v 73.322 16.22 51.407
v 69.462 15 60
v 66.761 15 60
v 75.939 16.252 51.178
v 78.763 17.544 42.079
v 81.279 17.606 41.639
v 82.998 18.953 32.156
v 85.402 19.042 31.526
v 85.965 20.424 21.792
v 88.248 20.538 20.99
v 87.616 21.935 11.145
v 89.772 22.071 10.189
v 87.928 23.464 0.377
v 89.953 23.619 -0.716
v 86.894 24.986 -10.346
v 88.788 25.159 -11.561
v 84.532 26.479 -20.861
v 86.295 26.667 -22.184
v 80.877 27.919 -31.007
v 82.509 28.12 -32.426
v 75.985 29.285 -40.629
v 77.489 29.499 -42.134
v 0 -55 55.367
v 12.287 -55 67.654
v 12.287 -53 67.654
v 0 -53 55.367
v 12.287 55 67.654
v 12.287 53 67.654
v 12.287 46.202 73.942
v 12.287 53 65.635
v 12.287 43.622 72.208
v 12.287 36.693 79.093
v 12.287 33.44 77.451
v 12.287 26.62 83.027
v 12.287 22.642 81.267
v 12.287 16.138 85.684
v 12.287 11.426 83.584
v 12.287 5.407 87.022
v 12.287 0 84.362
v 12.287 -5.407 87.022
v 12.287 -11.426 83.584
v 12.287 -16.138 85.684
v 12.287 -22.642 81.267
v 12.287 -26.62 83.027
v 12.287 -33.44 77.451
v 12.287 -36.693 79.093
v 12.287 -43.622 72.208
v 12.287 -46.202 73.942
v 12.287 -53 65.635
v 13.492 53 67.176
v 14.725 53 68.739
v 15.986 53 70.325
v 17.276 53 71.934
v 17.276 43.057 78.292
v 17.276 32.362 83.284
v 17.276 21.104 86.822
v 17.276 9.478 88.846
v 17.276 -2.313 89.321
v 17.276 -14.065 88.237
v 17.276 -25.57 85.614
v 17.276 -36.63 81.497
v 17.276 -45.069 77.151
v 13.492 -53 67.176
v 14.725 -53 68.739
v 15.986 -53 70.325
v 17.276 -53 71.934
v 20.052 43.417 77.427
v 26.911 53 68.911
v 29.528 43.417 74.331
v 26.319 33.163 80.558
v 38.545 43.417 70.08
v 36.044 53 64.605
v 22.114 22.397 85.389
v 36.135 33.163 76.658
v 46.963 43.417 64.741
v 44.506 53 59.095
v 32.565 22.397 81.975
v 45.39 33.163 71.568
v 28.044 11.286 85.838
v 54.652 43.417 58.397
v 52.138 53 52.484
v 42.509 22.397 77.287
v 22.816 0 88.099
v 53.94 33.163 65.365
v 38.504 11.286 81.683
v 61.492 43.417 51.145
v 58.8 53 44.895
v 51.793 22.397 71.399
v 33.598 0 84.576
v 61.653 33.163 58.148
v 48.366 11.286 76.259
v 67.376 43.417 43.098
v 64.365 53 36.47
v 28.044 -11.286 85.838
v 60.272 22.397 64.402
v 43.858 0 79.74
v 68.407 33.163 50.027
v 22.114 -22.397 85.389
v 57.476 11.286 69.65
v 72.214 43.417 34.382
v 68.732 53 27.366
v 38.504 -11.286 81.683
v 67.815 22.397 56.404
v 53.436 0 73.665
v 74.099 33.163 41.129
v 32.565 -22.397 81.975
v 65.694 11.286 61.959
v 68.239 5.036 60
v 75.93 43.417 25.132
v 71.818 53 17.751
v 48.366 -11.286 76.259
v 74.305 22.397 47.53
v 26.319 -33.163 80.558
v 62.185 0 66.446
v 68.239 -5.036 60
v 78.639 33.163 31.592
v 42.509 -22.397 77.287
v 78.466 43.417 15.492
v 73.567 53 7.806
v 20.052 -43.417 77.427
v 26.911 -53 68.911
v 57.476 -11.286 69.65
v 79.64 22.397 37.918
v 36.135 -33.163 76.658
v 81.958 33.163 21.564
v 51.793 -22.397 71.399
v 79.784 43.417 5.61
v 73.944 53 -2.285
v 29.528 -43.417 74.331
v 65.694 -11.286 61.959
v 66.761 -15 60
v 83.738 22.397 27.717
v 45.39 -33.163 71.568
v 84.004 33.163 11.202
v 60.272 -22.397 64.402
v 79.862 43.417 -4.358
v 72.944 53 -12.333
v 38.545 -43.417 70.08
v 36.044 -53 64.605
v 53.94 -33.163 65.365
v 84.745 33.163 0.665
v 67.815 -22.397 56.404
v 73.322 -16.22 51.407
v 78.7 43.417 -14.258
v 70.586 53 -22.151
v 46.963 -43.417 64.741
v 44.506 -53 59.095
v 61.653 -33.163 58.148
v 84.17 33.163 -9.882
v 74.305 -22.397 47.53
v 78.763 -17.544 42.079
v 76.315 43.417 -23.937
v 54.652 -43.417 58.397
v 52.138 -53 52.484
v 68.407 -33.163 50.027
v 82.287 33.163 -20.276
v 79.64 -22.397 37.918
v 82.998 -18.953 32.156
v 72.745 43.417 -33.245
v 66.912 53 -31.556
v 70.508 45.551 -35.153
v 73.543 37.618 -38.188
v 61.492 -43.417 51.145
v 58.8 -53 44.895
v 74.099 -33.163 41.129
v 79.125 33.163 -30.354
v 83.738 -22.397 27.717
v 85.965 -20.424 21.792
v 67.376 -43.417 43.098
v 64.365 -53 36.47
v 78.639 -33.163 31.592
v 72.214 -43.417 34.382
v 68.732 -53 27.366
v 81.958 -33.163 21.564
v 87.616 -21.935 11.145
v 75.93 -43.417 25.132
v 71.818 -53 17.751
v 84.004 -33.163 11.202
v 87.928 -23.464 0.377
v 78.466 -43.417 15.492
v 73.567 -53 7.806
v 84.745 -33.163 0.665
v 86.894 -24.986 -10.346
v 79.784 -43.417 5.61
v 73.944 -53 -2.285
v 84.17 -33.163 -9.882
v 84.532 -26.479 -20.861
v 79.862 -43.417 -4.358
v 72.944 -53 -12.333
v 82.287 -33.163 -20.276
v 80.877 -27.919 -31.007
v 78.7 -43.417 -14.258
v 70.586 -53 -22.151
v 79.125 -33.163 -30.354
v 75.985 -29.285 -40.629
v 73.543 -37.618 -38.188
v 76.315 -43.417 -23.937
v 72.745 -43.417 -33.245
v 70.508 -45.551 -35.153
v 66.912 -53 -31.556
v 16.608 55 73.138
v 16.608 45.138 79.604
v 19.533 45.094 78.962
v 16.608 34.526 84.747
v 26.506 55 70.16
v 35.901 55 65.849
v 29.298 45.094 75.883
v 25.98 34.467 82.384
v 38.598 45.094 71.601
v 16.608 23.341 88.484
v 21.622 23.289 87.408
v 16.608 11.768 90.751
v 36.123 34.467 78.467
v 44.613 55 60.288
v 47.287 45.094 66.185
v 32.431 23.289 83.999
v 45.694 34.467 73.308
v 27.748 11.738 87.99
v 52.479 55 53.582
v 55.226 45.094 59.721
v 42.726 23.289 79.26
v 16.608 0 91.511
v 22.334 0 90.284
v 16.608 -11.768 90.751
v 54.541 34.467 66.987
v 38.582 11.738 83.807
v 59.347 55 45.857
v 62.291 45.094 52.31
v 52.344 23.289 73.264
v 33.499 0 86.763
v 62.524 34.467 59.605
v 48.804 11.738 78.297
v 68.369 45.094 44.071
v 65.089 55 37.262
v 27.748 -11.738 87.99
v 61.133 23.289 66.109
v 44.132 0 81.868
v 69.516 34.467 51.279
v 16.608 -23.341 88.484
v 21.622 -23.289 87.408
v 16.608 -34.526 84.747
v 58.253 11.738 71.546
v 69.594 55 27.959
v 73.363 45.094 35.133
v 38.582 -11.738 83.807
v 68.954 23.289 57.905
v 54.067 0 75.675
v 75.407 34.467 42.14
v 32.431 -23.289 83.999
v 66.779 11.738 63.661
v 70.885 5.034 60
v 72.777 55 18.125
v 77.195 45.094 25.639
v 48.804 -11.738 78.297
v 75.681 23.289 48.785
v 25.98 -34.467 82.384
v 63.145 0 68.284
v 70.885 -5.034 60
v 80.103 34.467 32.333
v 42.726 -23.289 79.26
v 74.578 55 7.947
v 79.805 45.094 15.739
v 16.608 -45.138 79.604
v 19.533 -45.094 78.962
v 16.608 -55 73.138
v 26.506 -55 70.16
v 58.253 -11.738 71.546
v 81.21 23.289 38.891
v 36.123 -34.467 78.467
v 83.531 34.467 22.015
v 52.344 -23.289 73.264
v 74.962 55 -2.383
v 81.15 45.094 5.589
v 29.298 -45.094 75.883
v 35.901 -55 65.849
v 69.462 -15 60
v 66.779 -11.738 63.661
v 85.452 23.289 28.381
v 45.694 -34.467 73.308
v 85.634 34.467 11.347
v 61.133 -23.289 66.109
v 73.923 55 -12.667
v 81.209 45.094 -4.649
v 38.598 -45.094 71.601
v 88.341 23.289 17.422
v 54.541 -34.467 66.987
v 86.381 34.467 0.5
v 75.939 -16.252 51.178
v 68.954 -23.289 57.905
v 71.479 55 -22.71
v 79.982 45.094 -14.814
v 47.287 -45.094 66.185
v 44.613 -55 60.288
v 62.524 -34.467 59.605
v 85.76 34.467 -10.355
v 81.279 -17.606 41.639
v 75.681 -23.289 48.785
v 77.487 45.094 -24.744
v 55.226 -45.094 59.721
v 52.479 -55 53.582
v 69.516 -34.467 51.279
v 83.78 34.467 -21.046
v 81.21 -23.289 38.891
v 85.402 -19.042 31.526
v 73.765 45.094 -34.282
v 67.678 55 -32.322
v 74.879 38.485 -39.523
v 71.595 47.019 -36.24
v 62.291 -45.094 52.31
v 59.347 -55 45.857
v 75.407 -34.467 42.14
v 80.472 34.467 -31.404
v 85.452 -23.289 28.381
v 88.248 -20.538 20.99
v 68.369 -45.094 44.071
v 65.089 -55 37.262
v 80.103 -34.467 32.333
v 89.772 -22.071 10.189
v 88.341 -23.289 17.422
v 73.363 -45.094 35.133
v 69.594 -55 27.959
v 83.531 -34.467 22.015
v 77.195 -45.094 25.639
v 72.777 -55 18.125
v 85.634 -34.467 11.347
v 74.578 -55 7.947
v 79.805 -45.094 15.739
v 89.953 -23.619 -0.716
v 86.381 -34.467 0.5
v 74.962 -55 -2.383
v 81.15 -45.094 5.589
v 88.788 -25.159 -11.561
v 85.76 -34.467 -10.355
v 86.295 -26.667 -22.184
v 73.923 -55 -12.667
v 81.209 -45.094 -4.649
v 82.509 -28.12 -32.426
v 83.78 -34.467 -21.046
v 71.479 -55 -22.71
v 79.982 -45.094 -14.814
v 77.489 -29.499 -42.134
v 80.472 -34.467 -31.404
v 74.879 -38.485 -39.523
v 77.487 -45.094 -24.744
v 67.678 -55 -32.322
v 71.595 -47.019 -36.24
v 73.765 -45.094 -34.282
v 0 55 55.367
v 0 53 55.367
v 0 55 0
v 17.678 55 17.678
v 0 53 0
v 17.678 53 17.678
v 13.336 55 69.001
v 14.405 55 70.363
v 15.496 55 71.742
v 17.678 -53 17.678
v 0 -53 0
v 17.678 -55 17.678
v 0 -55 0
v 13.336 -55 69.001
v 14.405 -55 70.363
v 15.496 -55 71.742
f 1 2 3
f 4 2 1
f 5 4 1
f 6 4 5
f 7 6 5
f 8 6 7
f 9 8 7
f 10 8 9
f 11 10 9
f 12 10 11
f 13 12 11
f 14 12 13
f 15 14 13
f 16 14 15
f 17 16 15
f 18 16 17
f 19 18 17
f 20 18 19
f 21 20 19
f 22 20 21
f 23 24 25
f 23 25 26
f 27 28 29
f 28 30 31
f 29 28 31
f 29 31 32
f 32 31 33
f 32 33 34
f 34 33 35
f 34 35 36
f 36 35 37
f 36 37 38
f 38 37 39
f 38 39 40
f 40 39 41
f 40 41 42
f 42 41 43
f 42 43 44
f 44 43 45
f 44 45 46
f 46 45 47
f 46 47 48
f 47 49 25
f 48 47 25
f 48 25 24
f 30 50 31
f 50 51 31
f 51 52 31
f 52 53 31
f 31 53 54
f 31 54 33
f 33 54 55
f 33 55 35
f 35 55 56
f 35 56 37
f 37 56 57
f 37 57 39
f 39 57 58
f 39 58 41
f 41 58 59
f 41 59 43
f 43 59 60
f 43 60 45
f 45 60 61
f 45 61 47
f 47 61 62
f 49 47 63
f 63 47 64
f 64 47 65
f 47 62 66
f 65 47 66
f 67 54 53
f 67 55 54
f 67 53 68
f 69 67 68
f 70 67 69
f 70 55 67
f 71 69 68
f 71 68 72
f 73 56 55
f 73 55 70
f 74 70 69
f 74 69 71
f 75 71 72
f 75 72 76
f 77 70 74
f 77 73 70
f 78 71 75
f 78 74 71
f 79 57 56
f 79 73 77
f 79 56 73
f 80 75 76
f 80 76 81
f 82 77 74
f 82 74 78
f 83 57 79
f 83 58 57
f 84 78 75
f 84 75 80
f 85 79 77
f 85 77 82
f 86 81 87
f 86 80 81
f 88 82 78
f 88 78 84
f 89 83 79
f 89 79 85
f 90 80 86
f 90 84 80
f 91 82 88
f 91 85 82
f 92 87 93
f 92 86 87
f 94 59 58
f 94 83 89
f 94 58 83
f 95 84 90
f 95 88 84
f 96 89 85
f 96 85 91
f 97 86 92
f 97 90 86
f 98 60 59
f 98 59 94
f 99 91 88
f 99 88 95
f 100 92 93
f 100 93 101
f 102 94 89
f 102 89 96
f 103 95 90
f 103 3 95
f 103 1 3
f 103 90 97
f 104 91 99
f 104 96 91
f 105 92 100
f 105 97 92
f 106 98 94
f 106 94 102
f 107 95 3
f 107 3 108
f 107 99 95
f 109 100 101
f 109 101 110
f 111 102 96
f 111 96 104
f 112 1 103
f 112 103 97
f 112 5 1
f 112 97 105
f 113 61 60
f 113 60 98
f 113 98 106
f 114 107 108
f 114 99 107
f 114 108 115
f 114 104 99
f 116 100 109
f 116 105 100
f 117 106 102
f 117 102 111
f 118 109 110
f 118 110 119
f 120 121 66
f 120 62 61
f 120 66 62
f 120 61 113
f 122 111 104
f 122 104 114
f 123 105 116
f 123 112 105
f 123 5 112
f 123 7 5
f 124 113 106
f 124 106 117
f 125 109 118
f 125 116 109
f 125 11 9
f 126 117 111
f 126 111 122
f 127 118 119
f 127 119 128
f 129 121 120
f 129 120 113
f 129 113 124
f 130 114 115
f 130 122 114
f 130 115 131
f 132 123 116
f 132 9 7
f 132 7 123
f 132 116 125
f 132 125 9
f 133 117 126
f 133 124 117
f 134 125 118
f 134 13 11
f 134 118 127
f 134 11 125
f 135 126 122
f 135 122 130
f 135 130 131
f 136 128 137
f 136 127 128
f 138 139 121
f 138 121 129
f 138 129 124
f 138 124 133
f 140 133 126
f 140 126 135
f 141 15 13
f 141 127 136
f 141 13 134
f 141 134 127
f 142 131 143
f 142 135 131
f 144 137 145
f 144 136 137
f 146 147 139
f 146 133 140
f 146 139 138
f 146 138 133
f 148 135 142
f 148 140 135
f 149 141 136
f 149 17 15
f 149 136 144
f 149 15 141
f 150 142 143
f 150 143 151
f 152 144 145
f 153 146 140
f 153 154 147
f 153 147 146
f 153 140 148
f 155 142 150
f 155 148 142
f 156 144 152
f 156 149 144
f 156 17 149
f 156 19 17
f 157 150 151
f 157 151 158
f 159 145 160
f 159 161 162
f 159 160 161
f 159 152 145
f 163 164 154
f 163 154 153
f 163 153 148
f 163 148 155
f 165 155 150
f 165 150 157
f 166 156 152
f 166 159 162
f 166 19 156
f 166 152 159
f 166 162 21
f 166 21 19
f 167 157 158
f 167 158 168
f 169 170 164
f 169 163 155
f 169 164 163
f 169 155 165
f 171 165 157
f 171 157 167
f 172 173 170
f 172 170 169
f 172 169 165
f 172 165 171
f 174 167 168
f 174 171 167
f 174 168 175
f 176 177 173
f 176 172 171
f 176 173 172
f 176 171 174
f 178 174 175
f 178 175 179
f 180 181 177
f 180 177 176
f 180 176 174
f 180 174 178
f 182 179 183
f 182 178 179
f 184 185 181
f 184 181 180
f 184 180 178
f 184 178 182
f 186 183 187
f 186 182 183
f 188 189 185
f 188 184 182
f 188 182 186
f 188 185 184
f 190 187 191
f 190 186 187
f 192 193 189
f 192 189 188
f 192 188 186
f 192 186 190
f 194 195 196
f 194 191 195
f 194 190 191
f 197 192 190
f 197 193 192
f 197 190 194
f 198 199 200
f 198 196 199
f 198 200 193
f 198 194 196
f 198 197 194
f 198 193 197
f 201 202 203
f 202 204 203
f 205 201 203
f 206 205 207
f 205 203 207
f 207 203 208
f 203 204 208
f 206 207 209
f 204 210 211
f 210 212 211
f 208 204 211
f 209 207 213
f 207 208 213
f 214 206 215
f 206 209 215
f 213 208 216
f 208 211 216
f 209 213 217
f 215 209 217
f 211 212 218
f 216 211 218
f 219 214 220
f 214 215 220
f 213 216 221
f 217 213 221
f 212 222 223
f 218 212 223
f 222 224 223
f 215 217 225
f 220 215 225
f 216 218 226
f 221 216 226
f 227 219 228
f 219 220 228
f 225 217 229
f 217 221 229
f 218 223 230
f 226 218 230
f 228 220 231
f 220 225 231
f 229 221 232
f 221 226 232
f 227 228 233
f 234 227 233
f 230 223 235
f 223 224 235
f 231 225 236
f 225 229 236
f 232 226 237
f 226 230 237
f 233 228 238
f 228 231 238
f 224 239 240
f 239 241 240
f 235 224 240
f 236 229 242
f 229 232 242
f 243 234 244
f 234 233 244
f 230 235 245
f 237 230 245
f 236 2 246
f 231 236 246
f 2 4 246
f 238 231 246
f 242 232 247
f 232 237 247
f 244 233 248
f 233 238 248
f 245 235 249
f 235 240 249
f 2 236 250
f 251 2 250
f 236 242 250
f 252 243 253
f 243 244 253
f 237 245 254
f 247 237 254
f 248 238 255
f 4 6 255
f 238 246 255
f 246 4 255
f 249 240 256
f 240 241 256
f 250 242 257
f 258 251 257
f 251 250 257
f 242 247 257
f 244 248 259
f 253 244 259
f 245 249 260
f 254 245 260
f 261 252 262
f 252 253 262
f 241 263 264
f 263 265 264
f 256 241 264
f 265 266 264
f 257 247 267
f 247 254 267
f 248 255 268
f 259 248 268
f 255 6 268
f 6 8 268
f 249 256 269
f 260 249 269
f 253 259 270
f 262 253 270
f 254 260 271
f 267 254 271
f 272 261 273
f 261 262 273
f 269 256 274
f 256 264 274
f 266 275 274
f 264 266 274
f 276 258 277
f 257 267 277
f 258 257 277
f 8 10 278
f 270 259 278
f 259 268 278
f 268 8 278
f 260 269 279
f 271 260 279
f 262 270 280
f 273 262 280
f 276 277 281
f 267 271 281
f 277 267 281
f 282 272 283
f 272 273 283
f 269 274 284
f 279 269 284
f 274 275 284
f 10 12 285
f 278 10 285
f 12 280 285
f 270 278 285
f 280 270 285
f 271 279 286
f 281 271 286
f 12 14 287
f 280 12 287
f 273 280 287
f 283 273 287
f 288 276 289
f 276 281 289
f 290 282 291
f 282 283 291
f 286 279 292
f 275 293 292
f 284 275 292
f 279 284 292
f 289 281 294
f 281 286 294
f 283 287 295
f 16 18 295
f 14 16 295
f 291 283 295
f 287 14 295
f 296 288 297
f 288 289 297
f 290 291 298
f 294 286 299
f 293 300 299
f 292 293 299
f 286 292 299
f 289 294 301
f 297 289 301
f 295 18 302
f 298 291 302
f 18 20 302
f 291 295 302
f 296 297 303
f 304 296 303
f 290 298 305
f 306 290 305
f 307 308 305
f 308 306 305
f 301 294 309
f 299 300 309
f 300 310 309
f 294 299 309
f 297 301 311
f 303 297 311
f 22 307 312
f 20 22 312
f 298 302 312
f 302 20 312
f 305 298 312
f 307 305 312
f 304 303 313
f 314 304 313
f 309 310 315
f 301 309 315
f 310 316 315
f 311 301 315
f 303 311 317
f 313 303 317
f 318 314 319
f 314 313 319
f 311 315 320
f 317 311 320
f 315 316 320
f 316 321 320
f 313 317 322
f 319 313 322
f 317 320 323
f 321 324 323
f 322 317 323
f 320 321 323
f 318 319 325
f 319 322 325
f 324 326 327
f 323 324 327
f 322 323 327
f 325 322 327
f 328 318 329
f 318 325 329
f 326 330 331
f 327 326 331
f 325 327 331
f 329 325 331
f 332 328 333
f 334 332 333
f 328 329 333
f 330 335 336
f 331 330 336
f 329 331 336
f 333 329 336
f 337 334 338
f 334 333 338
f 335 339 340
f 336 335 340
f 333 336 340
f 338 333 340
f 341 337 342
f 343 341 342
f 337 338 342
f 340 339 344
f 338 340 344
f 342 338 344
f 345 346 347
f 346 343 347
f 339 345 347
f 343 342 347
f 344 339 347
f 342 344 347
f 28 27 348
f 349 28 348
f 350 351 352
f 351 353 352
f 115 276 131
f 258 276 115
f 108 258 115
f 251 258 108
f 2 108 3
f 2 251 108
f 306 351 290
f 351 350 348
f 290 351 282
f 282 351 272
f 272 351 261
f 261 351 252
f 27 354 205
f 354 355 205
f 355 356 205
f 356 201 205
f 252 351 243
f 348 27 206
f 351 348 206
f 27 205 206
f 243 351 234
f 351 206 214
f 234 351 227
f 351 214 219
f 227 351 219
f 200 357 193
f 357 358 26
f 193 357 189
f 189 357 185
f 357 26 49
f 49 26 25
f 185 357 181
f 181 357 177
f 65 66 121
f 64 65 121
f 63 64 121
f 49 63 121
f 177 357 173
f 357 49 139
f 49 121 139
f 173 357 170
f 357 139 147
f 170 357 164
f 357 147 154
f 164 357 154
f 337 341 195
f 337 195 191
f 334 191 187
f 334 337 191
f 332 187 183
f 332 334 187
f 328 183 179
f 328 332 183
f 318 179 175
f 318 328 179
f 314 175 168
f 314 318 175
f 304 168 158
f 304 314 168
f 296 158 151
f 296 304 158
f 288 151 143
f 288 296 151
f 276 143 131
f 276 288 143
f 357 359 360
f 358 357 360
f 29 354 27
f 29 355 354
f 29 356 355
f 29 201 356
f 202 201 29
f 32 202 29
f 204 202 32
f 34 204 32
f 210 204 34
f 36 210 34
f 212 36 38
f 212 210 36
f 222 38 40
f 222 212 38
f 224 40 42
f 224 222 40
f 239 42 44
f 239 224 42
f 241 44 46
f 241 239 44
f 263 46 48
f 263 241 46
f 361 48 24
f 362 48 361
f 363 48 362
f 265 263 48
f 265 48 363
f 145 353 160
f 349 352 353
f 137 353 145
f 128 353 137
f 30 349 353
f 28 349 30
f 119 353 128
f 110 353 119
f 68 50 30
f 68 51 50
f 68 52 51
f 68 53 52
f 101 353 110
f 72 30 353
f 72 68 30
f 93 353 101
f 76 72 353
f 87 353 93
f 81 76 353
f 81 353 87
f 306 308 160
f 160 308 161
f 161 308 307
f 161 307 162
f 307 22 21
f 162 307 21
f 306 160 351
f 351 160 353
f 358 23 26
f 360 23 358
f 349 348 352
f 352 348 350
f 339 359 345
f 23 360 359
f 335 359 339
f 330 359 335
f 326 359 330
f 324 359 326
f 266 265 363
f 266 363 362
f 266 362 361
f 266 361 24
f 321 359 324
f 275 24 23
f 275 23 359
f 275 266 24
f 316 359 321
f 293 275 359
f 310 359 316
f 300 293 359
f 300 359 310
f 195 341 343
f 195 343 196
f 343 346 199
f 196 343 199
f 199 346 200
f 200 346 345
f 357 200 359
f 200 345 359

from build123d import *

# Parameters (mm, degrees)
REVOLVE1_ANGLE      = 180
CUT_EXTRUDE1_DEPTH  = 172.464281995
CUT_EXTRUDE2_DEPTH  = 147.710676959
CHAMFER1_SIZE       = 5
SHELL1_T            = -2
BOSS_EXTRUDE1_DEPTH = 2


with BuildPart() as part:
    # Sketch1 → Revolve1 (revolve)
    with BuildSketch(Plane(origin=(0, 0, 0), x_dir=(0, 0, -1), z_dir=(1, 0, 0))):
        with BuildLine():
            Line((0, -55), (0, 55))
            Line((0, 55), (-75, 55))
            ThreePointArc((-75, 55), (-93.005376189, 0), (-75, -55))
            Line((-75, -55), (0, -55))
        make_face()
    revolve(axis=Axis((0, -55, 0), (0, 1, 0)), revolution_arc=REVOLVE1_ANGLE)

    # Sketch2 → Cut-Extrude1 (cut, through all)
    with BuildSketch(Plane.XZ.offset(55)):
        Polygon((0, 0), (0, 40), (12.287280664, 48.603646545), (12.287280664, 112.259604339), (-94.581934809, 112.259604339), (-94.581934809, -108.477643872), (97.057130945, -108.477643872), (97.057130945, -61.701791886), (17.67766953, 17.67766953), align=None)
    extrude(amount=-CUT_EXTRUDE1_DEPTH, mode=Mode.SUBTRACT)

    # Sketch3 → Cut-Extrude2 (cut, through all)
    with BuildSketch(Plane(origin=(100, 0, 0), x_dir=(0, 0, -1), z_dir=(1, 0, 0))):
        Polygon((-60, -15), (-60, 15), (45.666627767, 30), (45.666627767, -30), align=None)
    extrude(amount=-CUT_EXTRUDE2_DEPTH, mode=Mode.SUBTRACT)

    # Chamfer1
    # the kernel refuses this chamfer: 5, 4.450979534 mm, written as the material it takes off along each edge
    with BuildSketch(Plane(origin=(12.287280664, 0, 0), x_dir=(0, 0.7023997796774999, 0.7117826560889214), z_dir=(0, 0.7117826560889214, -0.7023997796774999))) as chamfer1_piece_1:
        with BuildLine():
            Line((92.190144451 - CHAMFER1_SIZE, 0), (91.510568486, 4.320424035))
            ThreePointArc((91.510568486, 4.320424035), (91.866596239, 2.222319448), (92.190144451, 0))
            Line((92.190144451, 0), (92.190144451 - CHAMFER1_SIZE, 0))
        make_face()
    revolve(axis=Axis((12.287280664, 0, 0), (1, 0, 0)), revolution_arc=89.239714317, mode=Mode.SUBTRACT)

    # Shell1
    shell1_openings = [part.faces().sort_by_distance(p)[0] for p in [
        (0, -37.799975499, 20.551470825),
        (44.318791783, -39.564539913, -8.963452724),
        (12.287280664, 0, 66.554150501),
        (8.951756718, -38.623299359, 8.951756718),
        (6.176749303, -36.112578818, 44.325006424),
        (8.951756718, 38.623299359, 8.951756718),
        (44.318791783, 39.564539913, -8.963452724),
        (6.176749303, 36.112578818, 44.325006424),
        (0, 37.799975499, 20.551470825),
        (41.411625019, 0, 60),
        (50.400096072, 20.67683416, 20.009871862),
        (50.400096072, -20.67683416, 20.009871862),
    ]]
    offset(amount=SHELL1_T, openings=shell1_openings)

    # Sketch4 → Boss-Extrude1 (add)
    with BuildSketch(Plane.XZ.offset(55)):
        Polygon((12.287280664, 67.654425497), (0, 55.367144833), (0, 40), (12.287280664, 48.603646545), align=None)
    boss_extrude1 = extrude(amount=-BOSS_EXTRUDE1_DEPTH)

    # Mirror1: Boss-Extrude1 across plane
    add(boss_extrude1.mirror(Plane.ZX))


solid = part.part
